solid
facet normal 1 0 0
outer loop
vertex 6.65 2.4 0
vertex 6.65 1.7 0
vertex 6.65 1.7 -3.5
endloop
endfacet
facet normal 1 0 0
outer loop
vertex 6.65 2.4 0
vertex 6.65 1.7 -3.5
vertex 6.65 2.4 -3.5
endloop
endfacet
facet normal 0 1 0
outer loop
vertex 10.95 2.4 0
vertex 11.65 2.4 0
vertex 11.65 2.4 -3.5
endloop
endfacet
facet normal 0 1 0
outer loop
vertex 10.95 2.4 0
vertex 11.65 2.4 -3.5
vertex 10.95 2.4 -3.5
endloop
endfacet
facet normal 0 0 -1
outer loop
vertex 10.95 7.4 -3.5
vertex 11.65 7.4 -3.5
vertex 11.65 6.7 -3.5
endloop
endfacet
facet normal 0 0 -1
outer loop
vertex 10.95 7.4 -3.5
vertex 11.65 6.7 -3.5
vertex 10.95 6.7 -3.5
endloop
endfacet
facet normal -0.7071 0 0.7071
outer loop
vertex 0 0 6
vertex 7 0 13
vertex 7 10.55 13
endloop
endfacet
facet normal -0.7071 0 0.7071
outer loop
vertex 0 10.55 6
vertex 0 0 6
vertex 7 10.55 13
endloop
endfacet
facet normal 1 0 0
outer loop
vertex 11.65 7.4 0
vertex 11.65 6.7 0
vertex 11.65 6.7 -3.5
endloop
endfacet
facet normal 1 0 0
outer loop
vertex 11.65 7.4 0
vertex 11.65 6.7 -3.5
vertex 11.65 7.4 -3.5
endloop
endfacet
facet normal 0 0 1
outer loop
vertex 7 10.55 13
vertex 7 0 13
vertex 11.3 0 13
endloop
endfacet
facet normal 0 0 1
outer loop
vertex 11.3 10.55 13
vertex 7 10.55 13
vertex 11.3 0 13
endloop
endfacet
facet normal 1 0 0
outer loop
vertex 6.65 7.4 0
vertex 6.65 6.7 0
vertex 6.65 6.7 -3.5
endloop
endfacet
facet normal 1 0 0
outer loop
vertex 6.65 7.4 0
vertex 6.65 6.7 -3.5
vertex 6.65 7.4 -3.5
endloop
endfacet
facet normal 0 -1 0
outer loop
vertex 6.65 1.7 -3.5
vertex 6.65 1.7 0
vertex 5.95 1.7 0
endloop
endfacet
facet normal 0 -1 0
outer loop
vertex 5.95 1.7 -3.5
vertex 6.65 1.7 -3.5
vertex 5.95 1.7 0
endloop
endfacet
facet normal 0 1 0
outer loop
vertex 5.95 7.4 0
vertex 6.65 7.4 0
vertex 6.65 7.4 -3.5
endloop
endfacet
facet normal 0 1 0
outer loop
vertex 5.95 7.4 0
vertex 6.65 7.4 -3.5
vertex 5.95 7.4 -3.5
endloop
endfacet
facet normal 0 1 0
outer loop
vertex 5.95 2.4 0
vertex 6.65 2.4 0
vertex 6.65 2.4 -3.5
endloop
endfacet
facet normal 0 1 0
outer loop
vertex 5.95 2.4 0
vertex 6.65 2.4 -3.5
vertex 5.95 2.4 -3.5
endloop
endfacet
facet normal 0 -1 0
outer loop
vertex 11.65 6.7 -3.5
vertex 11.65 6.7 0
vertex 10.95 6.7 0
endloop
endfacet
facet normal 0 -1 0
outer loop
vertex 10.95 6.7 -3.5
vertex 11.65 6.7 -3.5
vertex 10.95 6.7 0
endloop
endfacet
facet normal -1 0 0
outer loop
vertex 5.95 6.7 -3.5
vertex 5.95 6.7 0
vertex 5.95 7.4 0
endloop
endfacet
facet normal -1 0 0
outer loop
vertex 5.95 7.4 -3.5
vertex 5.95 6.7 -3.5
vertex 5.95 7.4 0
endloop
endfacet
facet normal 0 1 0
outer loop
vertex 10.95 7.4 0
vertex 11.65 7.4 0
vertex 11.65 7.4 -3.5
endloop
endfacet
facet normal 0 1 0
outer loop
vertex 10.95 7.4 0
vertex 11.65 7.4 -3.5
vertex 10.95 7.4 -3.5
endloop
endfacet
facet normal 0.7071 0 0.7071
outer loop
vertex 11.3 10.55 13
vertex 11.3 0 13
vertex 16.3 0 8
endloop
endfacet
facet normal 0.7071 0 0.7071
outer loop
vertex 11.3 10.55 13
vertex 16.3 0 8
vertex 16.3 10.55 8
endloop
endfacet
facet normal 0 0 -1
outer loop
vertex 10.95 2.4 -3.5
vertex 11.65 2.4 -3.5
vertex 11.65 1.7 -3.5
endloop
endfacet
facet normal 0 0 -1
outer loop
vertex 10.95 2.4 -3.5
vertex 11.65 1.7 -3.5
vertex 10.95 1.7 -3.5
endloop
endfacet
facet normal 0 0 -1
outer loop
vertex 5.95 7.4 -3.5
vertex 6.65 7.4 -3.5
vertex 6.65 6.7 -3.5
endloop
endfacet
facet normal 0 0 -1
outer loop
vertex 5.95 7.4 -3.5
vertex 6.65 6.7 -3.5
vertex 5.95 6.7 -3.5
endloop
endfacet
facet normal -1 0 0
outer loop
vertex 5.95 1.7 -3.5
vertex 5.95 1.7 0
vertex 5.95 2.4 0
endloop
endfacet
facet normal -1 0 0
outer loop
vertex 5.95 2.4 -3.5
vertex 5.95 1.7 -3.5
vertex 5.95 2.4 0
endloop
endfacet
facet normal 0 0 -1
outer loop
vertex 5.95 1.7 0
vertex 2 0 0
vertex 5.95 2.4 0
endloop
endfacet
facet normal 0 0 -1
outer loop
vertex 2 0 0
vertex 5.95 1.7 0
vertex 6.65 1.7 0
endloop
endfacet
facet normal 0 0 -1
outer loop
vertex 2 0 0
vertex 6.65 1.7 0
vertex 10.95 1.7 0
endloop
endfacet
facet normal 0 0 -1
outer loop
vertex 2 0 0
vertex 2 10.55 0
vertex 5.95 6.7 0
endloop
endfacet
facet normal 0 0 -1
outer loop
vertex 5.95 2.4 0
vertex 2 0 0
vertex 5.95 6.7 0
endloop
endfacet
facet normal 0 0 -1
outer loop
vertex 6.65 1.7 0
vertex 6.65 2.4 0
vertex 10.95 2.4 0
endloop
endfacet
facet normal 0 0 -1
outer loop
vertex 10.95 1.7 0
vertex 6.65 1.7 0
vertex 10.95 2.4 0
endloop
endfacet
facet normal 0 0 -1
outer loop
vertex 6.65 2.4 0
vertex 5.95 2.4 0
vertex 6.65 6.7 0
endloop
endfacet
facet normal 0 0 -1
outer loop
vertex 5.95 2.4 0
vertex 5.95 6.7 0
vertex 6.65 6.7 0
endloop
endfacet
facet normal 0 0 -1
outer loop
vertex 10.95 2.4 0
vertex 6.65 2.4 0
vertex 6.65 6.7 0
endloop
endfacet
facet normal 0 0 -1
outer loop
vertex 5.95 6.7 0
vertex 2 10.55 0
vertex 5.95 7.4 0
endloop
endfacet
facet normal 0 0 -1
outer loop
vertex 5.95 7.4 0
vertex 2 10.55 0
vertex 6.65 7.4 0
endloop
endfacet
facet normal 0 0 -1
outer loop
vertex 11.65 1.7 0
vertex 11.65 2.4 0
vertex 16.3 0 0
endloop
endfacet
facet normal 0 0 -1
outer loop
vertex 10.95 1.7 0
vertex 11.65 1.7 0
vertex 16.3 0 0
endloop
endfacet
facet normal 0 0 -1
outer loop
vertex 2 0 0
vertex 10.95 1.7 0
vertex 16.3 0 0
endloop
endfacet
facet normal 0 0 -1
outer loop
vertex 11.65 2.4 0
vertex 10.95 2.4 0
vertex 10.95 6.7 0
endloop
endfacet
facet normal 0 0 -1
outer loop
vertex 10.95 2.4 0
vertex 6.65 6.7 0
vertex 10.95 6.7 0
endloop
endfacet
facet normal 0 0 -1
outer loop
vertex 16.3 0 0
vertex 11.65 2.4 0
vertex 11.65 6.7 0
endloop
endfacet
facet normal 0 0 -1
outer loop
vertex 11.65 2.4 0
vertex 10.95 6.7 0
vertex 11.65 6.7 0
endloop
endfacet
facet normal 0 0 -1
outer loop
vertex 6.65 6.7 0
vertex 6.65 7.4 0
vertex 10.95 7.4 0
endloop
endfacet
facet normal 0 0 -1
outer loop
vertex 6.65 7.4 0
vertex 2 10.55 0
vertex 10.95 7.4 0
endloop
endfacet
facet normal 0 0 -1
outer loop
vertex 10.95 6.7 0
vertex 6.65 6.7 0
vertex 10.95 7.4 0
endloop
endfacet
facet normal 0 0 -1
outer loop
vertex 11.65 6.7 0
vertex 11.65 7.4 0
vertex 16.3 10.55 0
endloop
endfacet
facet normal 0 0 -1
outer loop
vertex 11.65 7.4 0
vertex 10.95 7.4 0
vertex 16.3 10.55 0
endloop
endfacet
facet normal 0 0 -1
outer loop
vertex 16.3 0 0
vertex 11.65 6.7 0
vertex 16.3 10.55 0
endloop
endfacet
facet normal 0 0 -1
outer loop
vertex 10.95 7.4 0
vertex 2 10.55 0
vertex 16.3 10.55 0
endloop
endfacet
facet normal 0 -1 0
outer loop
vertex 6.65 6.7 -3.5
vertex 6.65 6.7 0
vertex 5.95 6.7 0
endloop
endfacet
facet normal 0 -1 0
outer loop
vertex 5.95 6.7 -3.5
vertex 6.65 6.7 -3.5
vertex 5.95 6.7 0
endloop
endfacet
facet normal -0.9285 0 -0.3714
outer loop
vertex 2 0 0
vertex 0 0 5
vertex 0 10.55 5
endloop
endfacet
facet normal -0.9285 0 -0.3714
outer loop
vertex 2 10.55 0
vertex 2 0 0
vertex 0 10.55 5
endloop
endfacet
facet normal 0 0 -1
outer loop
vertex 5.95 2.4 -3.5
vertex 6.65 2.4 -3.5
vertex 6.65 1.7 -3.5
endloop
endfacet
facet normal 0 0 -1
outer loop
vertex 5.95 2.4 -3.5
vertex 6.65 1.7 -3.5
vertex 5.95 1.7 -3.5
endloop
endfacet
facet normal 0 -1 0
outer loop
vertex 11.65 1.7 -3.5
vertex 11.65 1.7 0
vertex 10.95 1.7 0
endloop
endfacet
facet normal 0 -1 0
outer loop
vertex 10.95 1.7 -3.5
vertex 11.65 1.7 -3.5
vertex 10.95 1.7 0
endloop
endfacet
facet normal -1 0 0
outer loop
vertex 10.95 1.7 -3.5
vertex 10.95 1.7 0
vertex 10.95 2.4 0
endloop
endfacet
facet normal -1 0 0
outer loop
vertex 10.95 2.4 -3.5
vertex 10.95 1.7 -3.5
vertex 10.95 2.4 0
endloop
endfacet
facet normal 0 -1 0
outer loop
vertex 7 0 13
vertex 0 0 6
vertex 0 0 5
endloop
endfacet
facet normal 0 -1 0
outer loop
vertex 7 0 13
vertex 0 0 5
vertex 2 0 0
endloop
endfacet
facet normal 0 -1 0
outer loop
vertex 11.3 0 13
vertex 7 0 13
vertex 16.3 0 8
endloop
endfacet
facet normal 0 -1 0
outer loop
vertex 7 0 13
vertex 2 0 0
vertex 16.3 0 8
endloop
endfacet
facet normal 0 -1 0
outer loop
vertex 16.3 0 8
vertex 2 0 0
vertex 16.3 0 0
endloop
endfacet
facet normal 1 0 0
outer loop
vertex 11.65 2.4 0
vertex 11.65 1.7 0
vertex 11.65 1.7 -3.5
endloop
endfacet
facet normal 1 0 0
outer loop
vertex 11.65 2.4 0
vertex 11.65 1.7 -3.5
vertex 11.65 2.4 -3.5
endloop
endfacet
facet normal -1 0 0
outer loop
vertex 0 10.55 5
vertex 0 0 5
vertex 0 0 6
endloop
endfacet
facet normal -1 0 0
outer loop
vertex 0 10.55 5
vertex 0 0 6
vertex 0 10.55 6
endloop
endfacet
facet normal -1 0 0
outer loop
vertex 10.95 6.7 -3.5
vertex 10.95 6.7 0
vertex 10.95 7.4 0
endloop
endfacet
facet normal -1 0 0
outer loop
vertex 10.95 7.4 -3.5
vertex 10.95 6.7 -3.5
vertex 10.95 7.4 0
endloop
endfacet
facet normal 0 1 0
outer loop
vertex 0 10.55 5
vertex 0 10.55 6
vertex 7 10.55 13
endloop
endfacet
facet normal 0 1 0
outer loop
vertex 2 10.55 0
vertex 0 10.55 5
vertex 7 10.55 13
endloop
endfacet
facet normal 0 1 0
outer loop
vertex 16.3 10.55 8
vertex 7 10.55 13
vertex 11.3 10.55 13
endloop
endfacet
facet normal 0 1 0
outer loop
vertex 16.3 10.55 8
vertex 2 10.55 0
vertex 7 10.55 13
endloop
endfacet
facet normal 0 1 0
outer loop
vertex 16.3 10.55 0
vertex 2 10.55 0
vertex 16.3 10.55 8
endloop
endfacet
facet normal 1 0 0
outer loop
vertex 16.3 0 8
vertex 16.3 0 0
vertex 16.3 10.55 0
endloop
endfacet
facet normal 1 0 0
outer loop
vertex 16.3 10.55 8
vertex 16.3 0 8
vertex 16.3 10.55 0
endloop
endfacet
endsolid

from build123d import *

# Parameters (mm, degrees)
SKETCH_1_W      = 16.3
SKETCH_1_H      = 10.55
EXTRUDE_1_DEPTH = 13
CHAMFER_1_SIZE  = 5
CHAMFER_3_SIZE  = 2
CHAMFER_3_SIZE2 = 5
CHAMFER_4_SIZE  = 7
SKETCH_2_W      = 0.7
SKETCH_2_H      = 0.7
EXTRUDE_2_DEPTH = 3.5


with BuildPart() as part:
    # Эскиз1 → Бобышка-Вытянуть1 (new body)
    with BuildSketch(Plane.XY):
        with Locations((8.15, 5.275)):
            Rectangle(SKETCH_1_W, SKETCH_1_H)
    extrude(amount=EXTRUDE_1_DEPTH)

    # Фаска1
    chamfer_1_edges = [part.edges().sort_by_distance(p)[0] for p in [
        (16.3, 5.275, 13),
    ]]
    chamfer(chamfer_1_edges, length=CHAMFER_1_SIZE)

    # Фаска3
    chamfer_3_edges = [part.edges().sort_by_distance(p)[0] for p in [
        (0, 5.275, 0),
    ]]
    chamfer_3_side = [part.faces().sort_by_distance(p)[0] for p in [
        (8.15, 5.275, 0),
    ]]
    chamfer(chamfer_3_edges, length=CHAMFER_3_SIZE, length2=CHAMFER_3_SIZE2, reference=chamfer_3_side[0])

    # Фаска4
    chamfer_4_edges = [part.edges().sort_by_distance(p)[0] for p in [
        (0, 5.275, 13),
    ]]
    chamfer(chamfer_4_edges, length=CHAMFER_4_SIZE)

    # Эскиз2 → Бобышка-Вытянуть2 (add)
    with BuildSketch(Plane(origin=(0, 0, 0), x_dir=(-1, 0, 0), z_dir=(0, 0, -1))):
        with Locations((-6.3, 2.05)):
            Rectangle(SKETCH_2_W, SKETCH_2_H)
        with Locations((-6.3, 7.05)):
            Rectangle(SKETCH_2_W, SKETCH_2_H)
        with Locations((-11.3, 2.05)):
            Rectangle(SKETCH_2_W, SKETCH_2_H)
        with Locations((-11.3, 7.05)):
            Rectangle(SKETCH_2_W, SKETCH_2_H)
    extrude(amount=EXTRUDE_2_DEPTH)


solid = part.part
